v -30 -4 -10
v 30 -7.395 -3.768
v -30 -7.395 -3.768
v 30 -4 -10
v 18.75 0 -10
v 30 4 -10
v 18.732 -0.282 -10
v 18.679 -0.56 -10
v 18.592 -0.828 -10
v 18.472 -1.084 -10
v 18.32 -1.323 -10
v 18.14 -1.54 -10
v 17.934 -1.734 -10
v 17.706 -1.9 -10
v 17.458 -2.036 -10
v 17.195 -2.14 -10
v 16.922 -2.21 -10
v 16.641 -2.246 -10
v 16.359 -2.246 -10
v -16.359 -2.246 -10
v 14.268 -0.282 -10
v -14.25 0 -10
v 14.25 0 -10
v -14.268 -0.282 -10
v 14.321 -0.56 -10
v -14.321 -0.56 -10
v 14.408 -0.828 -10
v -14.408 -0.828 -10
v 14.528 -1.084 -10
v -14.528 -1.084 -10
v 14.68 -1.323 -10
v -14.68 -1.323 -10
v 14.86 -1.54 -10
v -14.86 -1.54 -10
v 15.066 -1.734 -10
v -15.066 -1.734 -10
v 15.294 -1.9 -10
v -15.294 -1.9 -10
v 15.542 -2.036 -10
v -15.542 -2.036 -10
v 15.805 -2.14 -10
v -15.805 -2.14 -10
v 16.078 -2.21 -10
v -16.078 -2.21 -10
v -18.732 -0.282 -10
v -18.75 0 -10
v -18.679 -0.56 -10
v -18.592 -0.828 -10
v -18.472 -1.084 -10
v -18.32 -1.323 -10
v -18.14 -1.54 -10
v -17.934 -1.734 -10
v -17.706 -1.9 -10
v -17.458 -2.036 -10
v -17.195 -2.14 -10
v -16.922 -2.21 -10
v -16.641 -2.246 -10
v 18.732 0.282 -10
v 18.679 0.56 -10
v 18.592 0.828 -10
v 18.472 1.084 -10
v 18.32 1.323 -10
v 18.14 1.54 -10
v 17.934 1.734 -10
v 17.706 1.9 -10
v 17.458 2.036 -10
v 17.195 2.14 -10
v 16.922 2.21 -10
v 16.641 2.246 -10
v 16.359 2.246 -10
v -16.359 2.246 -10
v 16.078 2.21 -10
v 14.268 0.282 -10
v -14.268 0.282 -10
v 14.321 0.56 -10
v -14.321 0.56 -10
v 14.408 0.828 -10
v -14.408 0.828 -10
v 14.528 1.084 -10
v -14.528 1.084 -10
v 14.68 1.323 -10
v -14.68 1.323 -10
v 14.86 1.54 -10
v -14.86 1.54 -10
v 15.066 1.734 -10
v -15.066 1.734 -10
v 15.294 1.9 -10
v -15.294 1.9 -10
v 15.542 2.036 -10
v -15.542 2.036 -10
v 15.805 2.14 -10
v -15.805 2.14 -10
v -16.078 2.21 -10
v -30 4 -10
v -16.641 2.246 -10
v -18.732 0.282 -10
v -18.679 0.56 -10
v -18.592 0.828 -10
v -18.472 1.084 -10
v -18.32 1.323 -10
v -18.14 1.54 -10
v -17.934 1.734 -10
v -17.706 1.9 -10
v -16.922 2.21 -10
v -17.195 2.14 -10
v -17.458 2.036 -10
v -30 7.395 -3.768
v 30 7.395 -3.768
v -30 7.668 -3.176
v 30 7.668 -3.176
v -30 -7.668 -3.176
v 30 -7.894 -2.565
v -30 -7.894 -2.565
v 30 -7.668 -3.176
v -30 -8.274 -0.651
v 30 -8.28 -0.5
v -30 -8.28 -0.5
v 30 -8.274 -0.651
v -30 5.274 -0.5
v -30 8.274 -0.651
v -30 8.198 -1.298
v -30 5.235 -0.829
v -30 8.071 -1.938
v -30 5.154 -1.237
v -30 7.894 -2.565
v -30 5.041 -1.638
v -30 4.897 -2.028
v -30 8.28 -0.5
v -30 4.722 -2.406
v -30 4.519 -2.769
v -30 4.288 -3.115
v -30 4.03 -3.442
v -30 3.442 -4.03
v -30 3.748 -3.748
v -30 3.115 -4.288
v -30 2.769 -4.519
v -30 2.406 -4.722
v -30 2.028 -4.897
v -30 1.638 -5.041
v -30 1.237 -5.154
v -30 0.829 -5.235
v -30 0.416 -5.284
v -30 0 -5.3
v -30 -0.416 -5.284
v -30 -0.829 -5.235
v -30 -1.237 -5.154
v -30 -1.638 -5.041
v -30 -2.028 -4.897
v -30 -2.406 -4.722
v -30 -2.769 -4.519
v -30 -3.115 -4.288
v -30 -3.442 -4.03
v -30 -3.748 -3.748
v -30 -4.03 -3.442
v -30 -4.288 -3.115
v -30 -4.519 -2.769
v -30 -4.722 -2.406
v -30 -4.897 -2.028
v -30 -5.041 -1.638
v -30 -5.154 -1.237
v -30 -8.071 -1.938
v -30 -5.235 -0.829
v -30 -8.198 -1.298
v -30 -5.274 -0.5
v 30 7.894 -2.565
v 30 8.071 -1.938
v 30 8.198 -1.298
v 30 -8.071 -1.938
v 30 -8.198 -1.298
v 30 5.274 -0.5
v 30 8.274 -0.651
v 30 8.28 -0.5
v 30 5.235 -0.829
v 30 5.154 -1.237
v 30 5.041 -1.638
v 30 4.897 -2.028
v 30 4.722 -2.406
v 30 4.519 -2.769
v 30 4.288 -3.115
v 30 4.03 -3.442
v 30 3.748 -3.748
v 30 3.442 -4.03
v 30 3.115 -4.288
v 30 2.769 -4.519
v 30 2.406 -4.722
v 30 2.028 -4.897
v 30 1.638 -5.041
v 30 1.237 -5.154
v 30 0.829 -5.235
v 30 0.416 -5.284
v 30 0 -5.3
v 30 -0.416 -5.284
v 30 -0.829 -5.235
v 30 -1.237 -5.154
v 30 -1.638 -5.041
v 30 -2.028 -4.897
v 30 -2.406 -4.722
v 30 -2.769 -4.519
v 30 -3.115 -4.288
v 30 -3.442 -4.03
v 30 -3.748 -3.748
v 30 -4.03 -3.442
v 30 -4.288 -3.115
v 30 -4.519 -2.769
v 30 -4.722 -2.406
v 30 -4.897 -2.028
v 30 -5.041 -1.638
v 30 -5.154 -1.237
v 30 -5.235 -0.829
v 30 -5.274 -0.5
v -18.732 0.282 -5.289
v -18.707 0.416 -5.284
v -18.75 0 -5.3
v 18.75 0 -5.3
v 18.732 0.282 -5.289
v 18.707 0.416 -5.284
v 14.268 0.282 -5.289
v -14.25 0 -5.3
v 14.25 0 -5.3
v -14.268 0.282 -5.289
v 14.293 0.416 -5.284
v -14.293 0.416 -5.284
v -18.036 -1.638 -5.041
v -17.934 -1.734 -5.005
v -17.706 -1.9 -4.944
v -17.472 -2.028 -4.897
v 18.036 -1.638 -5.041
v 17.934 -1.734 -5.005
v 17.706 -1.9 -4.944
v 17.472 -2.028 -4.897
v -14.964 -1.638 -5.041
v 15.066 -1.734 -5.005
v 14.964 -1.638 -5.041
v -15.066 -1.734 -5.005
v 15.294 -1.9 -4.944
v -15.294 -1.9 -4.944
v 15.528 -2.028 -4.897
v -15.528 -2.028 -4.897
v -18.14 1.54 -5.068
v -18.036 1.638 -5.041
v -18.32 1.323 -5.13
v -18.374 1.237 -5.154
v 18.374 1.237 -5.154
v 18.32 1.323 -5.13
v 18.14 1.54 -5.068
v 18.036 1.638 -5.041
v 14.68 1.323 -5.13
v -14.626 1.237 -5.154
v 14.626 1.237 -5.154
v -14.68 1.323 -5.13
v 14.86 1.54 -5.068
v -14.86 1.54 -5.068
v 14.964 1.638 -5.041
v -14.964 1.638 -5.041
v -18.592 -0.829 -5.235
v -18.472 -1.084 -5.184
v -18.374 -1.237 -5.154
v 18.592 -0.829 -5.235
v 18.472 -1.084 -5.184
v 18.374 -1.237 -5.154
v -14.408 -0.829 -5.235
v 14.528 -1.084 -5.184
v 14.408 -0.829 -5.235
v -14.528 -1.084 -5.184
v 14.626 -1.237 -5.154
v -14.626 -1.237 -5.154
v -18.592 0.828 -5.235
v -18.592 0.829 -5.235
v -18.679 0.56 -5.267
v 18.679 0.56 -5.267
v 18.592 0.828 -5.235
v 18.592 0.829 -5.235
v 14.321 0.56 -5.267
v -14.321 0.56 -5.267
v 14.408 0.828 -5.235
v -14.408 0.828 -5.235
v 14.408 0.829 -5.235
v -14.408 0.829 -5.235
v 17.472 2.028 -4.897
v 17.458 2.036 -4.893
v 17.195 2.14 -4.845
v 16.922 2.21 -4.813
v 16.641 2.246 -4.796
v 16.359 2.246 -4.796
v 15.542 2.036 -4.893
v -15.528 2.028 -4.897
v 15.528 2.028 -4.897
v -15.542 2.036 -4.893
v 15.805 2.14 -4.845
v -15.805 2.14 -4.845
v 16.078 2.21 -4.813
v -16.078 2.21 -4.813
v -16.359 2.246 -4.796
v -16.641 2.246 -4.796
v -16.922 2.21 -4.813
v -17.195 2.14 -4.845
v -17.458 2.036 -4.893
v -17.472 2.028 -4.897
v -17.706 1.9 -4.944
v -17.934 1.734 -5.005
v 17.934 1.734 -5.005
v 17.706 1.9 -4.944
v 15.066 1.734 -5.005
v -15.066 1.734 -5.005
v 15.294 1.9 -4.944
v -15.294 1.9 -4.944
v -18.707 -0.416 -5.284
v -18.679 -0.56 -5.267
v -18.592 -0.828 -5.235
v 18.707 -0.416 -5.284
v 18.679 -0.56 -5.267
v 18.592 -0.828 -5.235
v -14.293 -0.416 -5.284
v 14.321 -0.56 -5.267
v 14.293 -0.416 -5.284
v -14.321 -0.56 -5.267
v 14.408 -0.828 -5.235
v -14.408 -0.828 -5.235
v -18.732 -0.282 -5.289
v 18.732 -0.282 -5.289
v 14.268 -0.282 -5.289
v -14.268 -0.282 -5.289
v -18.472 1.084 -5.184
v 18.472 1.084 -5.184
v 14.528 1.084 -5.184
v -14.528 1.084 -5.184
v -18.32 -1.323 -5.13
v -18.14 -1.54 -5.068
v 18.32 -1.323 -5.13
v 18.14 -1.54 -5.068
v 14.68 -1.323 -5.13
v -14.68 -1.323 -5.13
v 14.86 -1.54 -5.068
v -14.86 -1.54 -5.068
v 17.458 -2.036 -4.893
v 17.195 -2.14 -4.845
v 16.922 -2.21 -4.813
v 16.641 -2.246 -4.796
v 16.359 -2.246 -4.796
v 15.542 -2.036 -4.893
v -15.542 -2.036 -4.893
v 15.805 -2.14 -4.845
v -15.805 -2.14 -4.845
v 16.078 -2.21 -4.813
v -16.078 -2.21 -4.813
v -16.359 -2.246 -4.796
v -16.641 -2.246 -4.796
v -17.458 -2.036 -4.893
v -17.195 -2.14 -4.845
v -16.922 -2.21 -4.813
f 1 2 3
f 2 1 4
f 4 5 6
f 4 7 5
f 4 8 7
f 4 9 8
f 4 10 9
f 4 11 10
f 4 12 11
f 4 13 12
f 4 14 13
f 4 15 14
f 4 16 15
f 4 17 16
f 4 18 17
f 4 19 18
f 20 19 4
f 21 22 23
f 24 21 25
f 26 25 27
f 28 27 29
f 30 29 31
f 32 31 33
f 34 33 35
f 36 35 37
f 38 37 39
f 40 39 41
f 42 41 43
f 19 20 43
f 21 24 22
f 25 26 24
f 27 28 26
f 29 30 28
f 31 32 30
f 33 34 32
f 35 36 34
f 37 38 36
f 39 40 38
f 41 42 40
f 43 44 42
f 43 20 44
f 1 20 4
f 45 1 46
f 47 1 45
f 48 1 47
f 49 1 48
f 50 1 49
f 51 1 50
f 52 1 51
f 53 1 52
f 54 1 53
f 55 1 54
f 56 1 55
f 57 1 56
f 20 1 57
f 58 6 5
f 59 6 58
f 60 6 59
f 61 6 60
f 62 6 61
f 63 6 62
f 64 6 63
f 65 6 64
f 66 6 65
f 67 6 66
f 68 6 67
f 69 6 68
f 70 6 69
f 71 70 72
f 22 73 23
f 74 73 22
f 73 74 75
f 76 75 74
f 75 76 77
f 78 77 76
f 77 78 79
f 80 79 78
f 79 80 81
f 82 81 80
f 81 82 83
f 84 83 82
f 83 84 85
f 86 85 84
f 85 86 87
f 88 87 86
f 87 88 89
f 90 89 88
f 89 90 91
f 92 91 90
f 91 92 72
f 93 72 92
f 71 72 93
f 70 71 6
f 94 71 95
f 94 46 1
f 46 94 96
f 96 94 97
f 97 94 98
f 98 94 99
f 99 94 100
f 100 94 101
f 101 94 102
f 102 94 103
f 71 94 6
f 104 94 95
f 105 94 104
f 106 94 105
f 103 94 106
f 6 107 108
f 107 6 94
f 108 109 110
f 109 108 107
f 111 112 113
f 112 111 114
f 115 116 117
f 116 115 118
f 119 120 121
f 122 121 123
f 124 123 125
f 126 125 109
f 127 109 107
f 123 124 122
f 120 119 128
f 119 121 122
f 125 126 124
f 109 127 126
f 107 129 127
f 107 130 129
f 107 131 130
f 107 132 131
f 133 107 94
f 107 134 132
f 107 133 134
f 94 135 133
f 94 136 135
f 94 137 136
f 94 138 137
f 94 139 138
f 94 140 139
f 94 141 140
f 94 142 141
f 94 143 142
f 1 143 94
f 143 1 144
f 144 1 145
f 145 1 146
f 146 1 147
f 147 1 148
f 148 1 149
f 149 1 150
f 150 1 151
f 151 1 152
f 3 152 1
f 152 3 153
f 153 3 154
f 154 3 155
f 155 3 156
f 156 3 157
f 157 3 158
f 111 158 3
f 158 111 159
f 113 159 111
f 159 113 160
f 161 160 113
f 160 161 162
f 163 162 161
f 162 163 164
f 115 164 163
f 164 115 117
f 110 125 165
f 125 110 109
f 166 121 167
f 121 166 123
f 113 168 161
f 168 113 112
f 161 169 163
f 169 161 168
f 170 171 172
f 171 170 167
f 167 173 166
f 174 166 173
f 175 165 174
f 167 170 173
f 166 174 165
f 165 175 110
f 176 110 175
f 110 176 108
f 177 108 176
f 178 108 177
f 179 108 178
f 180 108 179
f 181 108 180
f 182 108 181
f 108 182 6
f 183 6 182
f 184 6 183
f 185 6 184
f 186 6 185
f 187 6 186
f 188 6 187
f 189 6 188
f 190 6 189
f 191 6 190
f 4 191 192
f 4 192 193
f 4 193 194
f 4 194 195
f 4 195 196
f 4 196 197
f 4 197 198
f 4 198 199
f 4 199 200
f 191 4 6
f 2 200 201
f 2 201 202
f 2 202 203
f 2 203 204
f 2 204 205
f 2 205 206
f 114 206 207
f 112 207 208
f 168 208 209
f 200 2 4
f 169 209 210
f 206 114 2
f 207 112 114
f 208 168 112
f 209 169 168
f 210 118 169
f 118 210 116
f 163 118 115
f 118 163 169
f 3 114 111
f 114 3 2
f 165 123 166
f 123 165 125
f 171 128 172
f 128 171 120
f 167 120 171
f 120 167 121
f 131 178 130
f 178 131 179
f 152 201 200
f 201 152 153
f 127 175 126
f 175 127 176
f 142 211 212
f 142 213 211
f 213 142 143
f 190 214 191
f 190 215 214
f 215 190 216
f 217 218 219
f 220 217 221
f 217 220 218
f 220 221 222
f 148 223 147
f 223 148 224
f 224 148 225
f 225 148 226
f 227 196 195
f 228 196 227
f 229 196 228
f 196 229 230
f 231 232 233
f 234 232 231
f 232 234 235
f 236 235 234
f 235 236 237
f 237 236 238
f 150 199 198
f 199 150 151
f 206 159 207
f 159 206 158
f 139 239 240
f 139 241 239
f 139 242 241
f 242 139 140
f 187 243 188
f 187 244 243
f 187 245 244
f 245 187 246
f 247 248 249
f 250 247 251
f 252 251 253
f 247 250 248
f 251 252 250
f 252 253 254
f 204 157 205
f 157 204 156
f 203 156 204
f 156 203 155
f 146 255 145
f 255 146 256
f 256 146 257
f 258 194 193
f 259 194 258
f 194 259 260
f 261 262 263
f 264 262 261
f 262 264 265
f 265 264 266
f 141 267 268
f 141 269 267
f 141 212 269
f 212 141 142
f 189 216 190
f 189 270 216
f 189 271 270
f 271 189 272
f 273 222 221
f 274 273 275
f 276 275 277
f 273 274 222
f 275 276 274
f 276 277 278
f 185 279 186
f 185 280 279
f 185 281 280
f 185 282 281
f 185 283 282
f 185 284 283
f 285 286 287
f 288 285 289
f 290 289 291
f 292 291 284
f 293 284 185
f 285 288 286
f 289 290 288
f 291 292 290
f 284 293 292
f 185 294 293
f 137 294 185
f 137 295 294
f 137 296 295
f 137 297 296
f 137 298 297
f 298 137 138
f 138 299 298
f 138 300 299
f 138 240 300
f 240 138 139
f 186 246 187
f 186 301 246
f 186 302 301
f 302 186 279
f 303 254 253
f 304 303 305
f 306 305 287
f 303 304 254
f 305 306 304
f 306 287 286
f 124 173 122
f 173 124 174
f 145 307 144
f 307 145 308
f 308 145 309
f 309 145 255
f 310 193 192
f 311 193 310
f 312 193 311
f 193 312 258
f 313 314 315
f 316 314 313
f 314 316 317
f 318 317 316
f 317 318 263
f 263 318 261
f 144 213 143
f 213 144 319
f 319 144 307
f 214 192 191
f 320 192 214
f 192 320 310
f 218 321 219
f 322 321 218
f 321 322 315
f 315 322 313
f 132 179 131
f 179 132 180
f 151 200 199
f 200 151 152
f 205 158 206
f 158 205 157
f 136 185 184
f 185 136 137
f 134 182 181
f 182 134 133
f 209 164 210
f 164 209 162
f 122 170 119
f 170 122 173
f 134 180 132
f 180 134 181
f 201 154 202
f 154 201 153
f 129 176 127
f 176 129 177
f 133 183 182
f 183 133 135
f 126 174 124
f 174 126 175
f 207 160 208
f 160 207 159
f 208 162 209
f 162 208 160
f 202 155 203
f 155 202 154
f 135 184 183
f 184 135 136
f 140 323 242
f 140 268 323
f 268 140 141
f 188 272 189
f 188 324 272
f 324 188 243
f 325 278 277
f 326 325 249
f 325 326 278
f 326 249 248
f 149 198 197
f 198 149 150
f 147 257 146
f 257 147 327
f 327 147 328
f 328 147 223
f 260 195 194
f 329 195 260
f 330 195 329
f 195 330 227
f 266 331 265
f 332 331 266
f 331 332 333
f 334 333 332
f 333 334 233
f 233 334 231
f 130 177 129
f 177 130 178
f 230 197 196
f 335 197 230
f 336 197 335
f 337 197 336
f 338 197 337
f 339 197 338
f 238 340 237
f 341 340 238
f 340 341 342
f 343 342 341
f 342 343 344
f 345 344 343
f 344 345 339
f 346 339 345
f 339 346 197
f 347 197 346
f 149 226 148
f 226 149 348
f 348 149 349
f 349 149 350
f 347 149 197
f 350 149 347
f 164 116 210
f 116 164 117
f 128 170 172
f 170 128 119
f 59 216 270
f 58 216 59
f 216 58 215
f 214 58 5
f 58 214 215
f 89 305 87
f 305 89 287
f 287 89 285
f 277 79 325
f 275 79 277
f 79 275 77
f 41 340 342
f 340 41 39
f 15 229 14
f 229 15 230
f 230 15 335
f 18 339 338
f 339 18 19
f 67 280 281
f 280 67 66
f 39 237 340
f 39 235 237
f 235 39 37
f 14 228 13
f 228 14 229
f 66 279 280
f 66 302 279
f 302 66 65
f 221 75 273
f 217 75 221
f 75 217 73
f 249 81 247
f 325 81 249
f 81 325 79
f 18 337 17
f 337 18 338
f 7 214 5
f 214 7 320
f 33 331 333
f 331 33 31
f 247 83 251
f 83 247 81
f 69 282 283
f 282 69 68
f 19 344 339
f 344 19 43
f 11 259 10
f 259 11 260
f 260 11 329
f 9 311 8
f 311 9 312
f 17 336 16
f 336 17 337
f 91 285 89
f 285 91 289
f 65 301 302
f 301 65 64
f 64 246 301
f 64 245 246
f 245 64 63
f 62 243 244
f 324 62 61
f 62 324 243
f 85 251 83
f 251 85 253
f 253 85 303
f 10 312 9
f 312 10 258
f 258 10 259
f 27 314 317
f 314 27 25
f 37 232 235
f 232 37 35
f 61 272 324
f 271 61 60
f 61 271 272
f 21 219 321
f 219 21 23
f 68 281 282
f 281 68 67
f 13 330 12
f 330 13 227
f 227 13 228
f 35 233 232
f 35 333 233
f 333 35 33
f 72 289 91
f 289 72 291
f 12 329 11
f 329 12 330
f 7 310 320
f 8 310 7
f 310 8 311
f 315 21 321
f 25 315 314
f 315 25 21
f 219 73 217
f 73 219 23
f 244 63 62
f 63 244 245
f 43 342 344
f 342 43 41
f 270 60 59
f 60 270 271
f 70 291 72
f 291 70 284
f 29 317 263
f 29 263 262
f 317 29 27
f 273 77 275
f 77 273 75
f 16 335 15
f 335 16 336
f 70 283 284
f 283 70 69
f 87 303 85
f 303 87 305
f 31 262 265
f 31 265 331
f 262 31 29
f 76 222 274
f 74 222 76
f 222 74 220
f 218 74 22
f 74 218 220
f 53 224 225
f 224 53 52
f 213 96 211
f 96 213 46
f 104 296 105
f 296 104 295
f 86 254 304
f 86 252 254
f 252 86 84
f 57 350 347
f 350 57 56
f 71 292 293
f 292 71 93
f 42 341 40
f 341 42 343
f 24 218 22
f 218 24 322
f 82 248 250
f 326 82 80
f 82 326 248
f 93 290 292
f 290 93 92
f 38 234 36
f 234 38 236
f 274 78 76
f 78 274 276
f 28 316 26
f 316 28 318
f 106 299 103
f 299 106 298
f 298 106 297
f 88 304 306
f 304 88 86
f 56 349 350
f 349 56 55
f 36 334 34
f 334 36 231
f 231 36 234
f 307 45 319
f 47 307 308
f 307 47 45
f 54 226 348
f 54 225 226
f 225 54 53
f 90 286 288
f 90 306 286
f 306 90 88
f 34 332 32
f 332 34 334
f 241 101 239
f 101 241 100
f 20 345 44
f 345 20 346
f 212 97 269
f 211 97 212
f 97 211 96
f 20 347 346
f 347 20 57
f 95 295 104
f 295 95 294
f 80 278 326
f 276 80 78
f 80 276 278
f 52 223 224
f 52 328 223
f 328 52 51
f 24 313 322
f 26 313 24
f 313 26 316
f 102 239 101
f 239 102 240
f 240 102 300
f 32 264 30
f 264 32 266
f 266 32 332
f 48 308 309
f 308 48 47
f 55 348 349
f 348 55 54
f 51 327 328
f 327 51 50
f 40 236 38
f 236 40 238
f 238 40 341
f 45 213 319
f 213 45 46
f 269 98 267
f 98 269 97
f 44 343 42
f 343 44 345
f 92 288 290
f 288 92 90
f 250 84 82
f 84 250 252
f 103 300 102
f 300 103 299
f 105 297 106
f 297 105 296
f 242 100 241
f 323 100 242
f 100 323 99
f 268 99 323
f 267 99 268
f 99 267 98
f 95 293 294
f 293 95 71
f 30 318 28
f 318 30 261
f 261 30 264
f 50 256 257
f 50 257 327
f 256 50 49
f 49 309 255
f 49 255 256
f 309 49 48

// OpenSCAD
// file: lib/igus.scad
include <../../parameters.scad>


module efsm_12(){
    translate([0, 0, -(bearing_efsm_12_ag - bearing_efsm_12_B/2)]){
        translate([-bearing_efsm_12_h/2, -bearing_efsm_12_h/2, 0])
            cube([bearing_efsm_12_h, bearing_efsm_12_h, bearing_efsm_12_a1]);
        difference(){
            union(){
                intersection(){
                    translate([0,0, bearing_efsm_12_ag - bearing_efsm_12_B/2])
                        sphere(d=18, $fn = 50);
                    translate([0,0,-15])
                        cylinder(h = 30, d = 20);
                }
            }
            translate([0, 0, -15])
                cylinder(h=30, d=12);
        }
    }
}


module efsm_8(){
    translate([-33/2, -33/2, 0])
        cube([33, 33, 5.5]);
    translate([0,0,8.5])
        cylinder(h = 2, d1 = 18, d2 = 15);
    translate([0,0,6.5])
        cylinder(h = 7.94/2, d = 2);
    translate([0, 0, 6.5])
        sphere(r=3, $fn = 50);
}


module kstm_05(){
    import("../../STL/external/igus/KSTM_05_1.stl", convexity = 5);
}

module kstm_06(){
    import("../../STL/external/igus/KSTM_06_2.stl", convexity = 5);
}

module kstm_08(){
    import("../../STL/external/igus/KSTM_08_3.stl", convexity = 5);
}

module kstm_10(){
    import("../../STL/external/igus/KSTM_10_4.stl", convexity = 5);
}


data_kstm_center_height = [[5,7],[6,10],[8,10],[10,14]];
function kstm_center_height(type) = data_kstm_center_height[search(type, data_kstm_center_height)[0]][1];

data_kstm_hole_distance = [[5,25], [6,33], [8,33], [10,46], [12,46]];
function kstm_hole_distance(type) = data_kstm_hole_distance[search(type, data_kstm_hole_distance)[0]][1];

data_kstm_thickness = [[5,25], [6,33], [8,33], [10,46], [12,46]];
function kstm_thickness(type) = data_kstm_thickness[search(type, data_kstm_thickness)[0]][1];


translate([0, 0,  kstm_center_height(5)]) kstm_05();
translate([0, 20, kstm_center_height(6)]) kstm_06();
translate([0, 40, kstm_center_height(8)]) kstm_08();
translate([0, 60, kstm_center_height(10)]) kstm_10();
// main file
include <../parameters.scad>
use <lib/igus.scad>


module 888_2014(){
    kstm_base_thickness = 8;
    kstm_base_length = 60;
    wall = 3;

    difference(){
        hull(){
            translate([-kstm_base_length/2, -kstm_base_thickness/2, -10])
                cube([kstm_base_length, kstm_base_thickness, 1]);

            rotate([0, 90, 0])
                cylinder(d = tube_for_undercarriage_outer_diameter + 2*wall, h = kstm_base_length, center = true, $fn = 80);
        }

        rotate([0, 90, 0])
            cylinder(d = tube_for_undercarriage_outer_diameter, h = kstm_base_length + global_clearance, center = true, $fn = 80);

        translate([-50, -50, -global_clearance])
            cube(100);

        translate([kstm_hole_distance(8)/2, 0, 0])
            cylinder(d = M4_screw_diameter, h = 100, center = true, $fn = 50);

        translate([-kstm_hole_distance(8)/2, 0, 0])
            cylinder(d = M4_screw_diameter, h = 100, center = true, $fn = 50);
    }
}

888_2014();
